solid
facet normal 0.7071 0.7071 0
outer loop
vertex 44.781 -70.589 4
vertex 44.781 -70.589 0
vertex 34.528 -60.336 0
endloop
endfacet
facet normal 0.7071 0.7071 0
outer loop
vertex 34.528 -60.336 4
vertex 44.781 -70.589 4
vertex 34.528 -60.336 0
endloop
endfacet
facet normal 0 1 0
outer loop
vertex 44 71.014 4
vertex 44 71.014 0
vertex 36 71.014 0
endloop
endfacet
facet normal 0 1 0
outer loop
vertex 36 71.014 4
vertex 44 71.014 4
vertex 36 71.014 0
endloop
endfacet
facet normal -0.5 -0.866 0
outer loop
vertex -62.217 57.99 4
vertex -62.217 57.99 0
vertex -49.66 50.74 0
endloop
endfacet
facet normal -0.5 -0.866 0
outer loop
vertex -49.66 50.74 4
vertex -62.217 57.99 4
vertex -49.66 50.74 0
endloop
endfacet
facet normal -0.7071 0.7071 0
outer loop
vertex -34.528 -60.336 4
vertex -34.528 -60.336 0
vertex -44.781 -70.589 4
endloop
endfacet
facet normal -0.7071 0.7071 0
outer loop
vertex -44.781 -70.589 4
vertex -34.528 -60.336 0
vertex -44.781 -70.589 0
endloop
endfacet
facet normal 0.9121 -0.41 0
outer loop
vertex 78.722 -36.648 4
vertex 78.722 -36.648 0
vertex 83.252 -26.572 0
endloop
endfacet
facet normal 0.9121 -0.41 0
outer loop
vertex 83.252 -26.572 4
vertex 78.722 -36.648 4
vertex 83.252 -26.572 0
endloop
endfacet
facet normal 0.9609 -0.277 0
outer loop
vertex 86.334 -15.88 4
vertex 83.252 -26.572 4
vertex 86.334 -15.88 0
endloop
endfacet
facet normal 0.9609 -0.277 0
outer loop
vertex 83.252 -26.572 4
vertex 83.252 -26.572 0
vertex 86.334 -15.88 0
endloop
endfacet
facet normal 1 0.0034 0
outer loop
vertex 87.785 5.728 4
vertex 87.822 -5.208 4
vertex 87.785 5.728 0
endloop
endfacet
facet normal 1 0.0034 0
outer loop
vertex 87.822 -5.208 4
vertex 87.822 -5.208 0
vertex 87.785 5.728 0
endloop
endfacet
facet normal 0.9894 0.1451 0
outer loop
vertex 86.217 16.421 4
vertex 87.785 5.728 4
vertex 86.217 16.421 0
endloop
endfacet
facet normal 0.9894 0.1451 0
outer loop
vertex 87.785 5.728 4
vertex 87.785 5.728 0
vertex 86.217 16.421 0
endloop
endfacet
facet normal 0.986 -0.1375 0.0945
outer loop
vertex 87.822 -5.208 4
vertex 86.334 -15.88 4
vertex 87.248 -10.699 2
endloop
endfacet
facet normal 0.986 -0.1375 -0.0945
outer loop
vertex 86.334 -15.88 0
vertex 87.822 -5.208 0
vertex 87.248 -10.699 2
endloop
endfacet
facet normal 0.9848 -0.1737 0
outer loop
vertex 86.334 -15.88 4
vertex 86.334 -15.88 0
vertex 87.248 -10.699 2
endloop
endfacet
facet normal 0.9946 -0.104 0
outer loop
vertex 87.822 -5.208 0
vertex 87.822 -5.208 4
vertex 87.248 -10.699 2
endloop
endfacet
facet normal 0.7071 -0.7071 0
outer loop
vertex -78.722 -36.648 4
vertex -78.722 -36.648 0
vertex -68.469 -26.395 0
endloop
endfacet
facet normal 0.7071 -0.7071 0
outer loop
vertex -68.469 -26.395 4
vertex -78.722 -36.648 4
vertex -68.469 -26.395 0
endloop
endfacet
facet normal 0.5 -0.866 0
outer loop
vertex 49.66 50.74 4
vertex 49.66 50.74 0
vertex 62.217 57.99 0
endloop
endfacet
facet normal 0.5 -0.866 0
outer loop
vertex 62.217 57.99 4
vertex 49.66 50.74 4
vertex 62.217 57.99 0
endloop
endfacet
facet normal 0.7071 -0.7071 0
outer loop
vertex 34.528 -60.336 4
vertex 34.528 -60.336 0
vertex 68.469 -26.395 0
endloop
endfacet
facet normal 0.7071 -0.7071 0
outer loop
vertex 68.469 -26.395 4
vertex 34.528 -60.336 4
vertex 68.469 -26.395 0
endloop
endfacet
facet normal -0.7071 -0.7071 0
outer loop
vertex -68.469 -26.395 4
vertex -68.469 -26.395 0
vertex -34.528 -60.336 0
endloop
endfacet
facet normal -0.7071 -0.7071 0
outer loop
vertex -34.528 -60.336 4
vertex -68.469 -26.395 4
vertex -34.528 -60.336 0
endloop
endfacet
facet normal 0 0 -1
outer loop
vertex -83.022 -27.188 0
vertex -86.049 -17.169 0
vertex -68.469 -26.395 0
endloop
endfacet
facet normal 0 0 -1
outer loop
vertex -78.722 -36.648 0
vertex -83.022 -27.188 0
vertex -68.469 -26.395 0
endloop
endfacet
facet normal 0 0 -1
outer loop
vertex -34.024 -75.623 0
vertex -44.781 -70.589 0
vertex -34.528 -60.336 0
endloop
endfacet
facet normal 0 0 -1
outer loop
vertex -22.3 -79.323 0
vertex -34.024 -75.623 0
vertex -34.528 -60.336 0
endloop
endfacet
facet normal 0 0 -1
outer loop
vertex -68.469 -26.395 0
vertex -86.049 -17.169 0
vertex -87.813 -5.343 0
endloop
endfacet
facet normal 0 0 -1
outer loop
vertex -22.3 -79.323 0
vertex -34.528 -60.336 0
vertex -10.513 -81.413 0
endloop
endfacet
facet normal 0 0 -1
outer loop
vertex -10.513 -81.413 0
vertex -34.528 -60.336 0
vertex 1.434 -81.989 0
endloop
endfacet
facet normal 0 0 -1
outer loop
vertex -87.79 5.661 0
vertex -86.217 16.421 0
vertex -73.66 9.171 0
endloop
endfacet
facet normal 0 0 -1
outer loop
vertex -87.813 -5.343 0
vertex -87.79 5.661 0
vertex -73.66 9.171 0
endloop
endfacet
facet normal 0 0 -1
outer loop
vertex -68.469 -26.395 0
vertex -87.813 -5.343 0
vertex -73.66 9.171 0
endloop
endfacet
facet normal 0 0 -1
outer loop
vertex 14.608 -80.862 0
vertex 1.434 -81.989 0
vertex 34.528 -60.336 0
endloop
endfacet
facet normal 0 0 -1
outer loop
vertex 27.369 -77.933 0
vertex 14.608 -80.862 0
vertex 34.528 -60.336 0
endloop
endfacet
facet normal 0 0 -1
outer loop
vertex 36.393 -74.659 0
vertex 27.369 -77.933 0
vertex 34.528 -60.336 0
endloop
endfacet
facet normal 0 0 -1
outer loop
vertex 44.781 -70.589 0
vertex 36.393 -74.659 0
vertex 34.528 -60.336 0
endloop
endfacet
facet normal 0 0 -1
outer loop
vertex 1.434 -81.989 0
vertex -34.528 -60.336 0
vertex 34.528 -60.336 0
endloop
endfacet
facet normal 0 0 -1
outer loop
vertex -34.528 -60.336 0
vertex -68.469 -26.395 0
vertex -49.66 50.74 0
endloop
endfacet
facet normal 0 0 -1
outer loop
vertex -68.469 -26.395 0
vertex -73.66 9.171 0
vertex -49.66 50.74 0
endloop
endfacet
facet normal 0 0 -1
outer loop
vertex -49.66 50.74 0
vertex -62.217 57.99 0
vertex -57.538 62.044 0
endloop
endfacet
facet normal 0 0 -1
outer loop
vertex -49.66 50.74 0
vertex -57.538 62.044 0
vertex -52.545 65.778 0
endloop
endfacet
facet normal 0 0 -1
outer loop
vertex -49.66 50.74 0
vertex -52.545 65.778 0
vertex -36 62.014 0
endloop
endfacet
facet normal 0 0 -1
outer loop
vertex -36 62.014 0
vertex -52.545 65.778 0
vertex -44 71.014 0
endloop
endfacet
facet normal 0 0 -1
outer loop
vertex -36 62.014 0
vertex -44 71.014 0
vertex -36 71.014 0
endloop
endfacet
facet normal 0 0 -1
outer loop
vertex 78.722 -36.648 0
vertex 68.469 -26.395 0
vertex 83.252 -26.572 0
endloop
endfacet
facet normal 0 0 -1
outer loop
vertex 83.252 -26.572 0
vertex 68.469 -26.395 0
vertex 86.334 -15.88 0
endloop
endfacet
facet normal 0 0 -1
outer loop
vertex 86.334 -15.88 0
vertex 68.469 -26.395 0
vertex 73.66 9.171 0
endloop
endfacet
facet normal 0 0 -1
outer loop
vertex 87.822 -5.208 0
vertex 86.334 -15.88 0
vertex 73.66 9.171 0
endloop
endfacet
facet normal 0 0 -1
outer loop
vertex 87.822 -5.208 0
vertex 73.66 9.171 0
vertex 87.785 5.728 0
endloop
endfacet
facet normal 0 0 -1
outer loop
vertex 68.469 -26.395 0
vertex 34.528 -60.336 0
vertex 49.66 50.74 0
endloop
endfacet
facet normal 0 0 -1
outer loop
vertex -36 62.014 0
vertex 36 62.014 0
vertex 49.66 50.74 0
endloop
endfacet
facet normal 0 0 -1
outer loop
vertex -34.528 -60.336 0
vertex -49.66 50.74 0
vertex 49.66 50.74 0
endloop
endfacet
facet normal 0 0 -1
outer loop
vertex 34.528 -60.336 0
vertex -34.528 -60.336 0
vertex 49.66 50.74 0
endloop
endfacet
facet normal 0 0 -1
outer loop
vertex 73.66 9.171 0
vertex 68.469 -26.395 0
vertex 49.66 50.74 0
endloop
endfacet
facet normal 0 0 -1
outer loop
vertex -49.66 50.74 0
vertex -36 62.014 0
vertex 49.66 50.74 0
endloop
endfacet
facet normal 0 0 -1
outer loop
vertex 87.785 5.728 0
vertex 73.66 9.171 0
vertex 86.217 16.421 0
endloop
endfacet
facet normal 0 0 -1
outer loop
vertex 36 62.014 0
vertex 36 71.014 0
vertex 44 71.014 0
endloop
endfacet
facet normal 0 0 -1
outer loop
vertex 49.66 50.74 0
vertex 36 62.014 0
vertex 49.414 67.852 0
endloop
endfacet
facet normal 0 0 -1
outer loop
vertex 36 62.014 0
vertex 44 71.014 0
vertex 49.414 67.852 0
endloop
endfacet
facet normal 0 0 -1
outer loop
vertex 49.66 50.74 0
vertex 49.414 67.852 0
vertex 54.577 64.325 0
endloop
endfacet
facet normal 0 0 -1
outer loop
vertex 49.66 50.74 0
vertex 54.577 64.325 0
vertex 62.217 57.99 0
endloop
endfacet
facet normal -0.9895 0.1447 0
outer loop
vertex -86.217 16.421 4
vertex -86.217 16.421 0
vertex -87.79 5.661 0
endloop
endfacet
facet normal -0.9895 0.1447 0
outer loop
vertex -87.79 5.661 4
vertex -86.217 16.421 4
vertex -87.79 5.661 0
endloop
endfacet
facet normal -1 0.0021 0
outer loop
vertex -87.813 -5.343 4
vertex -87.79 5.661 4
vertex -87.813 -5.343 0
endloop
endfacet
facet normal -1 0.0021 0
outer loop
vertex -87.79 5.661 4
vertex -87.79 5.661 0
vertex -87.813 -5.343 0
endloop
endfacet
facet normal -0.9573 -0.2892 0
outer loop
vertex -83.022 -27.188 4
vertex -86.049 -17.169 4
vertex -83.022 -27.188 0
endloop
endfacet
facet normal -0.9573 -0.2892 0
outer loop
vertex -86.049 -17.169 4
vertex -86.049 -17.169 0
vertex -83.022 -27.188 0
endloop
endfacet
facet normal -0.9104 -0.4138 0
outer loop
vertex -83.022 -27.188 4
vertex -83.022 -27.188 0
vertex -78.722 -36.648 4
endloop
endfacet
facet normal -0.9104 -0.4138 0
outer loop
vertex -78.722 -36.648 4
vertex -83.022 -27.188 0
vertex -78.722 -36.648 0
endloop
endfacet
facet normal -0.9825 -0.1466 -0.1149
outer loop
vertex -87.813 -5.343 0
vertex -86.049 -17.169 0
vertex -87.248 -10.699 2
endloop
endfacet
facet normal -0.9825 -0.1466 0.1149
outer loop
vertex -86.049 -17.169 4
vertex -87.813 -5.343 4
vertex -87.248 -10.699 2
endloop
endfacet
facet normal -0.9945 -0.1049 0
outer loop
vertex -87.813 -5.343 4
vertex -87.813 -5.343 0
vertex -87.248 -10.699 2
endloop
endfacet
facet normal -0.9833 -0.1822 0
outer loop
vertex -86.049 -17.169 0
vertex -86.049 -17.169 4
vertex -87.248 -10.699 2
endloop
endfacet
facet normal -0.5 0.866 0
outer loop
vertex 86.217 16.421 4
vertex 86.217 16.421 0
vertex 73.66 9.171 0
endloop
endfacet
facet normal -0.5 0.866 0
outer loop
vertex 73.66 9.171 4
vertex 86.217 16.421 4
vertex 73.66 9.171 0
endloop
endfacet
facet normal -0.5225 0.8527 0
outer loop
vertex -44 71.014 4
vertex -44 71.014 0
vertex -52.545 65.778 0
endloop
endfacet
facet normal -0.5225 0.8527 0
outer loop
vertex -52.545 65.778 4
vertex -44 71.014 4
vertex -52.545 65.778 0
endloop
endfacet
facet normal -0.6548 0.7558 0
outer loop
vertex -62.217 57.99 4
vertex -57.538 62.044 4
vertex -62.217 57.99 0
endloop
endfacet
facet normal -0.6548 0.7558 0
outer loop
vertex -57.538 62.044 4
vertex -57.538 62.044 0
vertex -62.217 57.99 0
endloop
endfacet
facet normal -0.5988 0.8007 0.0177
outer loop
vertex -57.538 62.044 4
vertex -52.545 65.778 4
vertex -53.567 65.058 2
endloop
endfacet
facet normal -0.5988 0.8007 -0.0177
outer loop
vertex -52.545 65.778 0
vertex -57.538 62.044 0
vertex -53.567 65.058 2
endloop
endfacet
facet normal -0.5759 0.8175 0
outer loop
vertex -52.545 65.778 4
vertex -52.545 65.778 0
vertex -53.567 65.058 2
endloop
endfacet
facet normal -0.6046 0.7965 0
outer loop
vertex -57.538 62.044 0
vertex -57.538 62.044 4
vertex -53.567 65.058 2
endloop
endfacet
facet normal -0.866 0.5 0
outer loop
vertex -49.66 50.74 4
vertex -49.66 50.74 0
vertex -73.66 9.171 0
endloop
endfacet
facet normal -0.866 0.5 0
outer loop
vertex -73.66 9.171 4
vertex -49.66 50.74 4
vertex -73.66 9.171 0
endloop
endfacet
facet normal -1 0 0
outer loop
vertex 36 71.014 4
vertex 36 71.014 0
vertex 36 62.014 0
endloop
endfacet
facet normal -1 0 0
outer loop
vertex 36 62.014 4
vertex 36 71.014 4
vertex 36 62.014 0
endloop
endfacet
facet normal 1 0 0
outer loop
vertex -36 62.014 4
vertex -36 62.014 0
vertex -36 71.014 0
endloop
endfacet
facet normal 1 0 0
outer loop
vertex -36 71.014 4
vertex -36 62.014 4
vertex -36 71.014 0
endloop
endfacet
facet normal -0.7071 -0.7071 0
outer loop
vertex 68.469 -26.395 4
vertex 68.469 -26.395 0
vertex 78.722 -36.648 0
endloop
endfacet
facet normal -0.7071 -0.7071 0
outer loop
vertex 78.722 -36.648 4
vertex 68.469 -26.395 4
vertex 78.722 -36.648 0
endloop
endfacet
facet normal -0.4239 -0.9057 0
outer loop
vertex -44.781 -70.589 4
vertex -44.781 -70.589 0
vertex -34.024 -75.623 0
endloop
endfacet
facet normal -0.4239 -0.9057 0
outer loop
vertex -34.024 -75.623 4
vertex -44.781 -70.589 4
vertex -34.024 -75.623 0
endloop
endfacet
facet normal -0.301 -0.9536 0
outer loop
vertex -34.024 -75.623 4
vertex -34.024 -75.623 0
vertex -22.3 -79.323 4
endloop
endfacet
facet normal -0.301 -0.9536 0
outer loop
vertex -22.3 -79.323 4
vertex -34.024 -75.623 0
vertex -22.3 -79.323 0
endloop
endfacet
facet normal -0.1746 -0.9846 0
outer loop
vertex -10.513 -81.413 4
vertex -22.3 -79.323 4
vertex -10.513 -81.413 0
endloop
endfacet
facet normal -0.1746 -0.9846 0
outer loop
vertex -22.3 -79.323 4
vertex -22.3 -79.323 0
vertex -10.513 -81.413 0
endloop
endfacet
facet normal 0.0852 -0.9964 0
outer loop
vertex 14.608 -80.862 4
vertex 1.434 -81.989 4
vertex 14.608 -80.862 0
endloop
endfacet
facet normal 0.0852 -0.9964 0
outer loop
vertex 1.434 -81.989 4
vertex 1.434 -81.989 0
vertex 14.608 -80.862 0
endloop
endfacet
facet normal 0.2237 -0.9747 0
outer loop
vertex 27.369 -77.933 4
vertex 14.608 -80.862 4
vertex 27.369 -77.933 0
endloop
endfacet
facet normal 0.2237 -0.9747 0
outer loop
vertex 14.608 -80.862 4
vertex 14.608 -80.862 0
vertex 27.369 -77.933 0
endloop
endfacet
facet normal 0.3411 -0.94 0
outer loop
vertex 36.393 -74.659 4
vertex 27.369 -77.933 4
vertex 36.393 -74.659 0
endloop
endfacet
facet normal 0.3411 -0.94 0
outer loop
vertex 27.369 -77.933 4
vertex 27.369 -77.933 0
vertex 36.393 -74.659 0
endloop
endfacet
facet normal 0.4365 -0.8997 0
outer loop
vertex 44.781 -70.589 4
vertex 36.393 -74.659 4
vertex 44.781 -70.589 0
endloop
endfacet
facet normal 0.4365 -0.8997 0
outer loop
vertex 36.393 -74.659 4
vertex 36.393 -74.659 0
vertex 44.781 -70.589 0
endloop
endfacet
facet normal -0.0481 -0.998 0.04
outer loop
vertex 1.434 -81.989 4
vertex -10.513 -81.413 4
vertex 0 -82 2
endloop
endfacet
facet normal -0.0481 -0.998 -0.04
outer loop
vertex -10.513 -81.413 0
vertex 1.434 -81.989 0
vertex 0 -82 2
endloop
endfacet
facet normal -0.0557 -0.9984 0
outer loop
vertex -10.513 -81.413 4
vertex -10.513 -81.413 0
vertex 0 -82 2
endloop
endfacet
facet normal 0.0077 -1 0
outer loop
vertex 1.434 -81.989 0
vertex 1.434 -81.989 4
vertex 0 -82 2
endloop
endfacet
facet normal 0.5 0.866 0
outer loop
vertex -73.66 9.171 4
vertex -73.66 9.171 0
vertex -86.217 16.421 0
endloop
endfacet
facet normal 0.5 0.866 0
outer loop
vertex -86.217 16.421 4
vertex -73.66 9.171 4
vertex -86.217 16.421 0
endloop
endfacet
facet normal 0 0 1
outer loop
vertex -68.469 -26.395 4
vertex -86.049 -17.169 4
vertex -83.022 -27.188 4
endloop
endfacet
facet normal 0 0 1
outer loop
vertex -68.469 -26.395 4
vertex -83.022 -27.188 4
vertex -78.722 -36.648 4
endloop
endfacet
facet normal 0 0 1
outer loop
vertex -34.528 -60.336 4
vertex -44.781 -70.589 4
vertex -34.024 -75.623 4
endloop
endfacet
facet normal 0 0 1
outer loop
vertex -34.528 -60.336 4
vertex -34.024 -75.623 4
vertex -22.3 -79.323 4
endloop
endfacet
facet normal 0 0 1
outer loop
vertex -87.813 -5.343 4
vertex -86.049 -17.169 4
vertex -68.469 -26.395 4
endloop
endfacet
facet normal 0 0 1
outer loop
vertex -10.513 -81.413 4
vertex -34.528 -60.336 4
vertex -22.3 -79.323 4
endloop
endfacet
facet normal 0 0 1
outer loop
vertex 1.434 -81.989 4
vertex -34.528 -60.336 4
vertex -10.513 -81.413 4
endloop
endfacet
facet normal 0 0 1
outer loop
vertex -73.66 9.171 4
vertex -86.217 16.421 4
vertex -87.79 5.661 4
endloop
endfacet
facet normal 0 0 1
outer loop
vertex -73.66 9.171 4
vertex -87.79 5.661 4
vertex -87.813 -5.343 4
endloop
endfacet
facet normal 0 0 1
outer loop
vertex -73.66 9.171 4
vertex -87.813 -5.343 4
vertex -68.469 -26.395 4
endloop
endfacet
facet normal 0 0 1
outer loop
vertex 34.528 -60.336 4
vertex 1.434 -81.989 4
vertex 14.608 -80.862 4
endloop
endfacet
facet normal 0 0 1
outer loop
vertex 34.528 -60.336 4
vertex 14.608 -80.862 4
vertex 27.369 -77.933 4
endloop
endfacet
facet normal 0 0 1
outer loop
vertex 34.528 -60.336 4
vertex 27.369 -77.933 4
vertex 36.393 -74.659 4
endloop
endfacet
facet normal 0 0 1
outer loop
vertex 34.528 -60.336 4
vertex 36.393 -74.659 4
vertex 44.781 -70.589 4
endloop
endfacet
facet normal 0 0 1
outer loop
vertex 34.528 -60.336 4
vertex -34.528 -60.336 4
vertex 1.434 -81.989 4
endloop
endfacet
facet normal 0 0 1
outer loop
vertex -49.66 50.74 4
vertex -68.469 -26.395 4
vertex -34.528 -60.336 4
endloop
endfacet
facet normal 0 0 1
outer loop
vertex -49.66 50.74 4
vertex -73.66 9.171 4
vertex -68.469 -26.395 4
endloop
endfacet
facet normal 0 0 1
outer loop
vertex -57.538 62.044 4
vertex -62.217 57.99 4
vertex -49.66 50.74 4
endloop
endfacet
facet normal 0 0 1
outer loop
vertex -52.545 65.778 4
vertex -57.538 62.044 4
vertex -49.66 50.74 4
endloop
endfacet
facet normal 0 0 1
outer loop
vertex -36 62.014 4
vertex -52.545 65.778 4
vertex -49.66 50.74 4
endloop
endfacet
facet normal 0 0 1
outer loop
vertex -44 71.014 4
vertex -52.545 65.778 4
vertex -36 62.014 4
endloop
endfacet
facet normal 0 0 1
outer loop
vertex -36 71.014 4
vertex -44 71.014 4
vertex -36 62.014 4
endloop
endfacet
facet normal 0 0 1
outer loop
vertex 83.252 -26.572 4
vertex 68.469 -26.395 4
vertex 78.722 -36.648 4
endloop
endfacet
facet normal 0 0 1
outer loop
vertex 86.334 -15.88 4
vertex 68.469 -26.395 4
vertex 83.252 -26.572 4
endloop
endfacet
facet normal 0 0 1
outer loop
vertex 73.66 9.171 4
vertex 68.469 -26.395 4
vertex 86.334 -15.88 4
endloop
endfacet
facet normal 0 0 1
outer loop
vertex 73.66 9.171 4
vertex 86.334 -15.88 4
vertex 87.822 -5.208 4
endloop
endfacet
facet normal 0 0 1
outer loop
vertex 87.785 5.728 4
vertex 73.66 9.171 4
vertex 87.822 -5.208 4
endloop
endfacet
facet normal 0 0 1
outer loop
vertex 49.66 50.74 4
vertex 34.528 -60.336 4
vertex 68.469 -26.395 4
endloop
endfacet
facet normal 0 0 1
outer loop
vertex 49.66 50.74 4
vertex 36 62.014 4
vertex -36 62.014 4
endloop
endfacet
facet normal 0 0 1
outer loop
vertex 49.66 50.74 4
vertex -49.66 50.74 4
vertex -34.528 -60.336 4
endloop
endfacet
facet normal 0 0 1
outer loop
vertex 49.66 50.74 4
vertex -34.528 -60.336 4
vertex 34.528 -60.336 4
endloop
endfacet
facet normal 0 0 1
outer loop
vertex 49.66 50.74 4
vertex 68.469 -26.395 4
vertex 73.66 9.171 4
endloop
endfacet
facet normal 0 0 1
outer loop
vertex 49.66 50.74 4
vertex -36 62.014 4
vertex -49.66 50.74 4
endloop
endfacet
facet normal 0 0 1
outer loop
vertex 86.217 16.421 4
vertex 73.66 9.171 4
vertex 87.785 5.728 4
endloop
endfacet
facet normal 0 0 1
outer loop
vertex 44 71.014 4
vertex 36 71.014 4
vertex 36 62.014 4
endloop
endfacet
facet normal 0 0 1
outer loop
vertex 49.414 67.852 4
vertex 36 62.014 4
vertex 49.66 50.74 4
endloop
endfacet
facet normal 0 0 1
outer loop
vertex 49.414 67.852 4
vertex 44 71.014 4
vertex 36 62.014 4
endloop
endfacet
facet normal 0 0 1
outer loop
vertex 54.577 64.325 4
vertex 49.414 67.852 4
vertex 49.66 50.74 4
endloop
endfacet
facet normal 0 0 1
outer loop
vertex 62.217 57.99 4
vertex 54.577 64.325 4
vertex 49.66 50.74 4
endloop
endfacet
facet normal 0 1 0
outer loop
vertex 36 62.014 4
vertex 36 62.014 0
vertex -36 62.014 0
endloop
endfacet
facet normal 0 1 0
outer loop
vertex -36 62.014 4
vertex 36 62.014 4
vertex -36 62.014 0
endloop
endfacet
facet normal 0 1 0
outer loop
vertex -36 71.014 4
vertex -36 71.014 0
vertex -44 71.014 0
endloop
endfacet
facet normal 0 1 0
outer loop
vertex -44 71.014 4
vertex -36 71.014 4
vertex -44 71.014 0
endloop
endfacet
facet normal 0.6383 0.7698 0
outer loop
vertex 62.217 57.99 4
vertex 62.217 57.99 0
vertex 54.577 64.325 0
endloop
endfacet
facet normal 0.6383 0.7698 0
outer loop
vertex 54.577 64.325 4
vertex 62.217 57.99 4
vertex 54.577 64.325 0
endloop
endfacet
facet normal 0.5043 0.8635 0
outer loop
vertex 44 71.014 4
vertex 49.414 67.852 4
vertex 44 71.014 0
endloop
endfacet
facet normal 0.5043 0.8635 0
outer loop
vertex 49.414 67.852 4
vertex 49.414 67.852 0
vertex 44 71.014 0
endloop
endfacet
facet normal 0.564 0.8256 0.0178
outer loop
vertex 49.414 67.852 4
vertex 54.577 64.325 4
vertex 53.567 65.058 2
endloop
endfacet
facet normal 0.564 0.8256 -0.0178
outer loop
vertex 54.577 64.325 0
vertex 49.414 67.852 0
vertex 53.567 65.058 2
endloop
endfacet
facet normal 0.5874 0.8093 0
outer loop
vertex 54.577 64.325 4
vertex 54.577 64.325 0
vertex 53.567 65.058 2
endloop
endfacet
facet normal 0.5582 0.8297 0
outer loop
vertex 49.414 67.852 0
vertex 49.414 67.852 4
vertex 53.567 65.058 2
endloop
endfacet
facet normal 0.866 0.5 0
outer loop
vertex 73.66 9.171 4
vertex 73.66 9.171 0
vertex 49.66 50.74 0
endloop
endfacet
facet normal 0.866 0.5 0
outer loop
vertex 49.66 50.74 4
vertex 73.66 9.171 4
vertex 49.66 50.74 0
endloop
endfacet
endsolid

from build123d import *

# Parameters (mm, degrees)
F1_DEPTH = 4


with BuildPart() as f1:
    # F0 (on Top) → F1 (new body)
    with BuildSketch(Plane.XY):
        with BuildLine():
            Line((-36, 71.0140831103), (-44, 71.0140831103))
            add(Edge.make_bspline(
                [(-44, 71.0140831103), (-54.0283164257, 65.6189945034), (-62.2174482843, 57.990161631)],
                knots=[5.235987756, 5.235987756, 5.235987756, 5.4976594153, 5.4976594153, 5.4976594153], degree=2, weights=[1, 0.9914531953, 1]))
            Line((-62.2174482843, 57.990161631), (-49.6600799294, 50.740161631))
            Line((-49.6600799294, 50.740161631), (-73.6600799294, 9.1709422494))
            Line((-73.6600799294, 9.1709422494), (-86.2174482843, 16.4209422494))
            add(Edge.make_bspline(
                [(-86.2174482843, 16.4209422494), (-92.3022663318, -11.319095525), (-78.7223993606, -36.6476383594)],
                knots=[6.0815667198, 6.0815667198, 6.0815667198, 6.7465073975, 6.7465073975, 6.7465073975], degree=2, weights=[1, 0.9452389616, 1]))
            Line((-78.7223993606, -36.6476383594), (-68.4693510334, -26.3945900322))
            Line((-68.4693510334, -26.3945900322), (-34.5282255364, -60.3357155292))
            Line((-34.5282255364, -60.3357155292), (-44.7812738636, -70.5887638564))
            add(Edge.make_bspline(
                [(-44.7812738636, -70.5887638564), (0, -95.2559533934), (44.7812738636, -70.5887638564)],
                knots=[1.0369152893, 1.0369152893, 1.0369152893, 2.1046773643, 2.1046773643, 2.1046773643], degree=2, weights=[1, 0.8608385836, 1]))
            Line((44.7812738636, -70.5887638564), (34.5282255364, -60.3357155292))
            Line((34.5282255364, -60.3357155292), (68.4693510334, -26.3945900322))
            Line((68.4693510334, -26.3945900322), (78.7223993606, -36.6476383594))
            add(Edge.make_bspline(
                [(78.7223993606, -36.6476383594), (92.3022663318, -11.319095525), (86.2174482843, 16.4209422494)],
                knots=[2.6782705633, 2.6782705633, 2.6782705633, 3.343211241, 3.343211241, 3.343211241], degree=2, weights=[1, 0.9452389616, 1]))
            Line((86.2174482843, 16.4209422494), (73.6600799294, 9.1709422494))
            Line((73.6600799294, 9.1709422494), (49.6600799294, 50.740161631))
            Line((49.6600799294, 50.740161631), (62.2174482843, 57.990161631))
            add(Edge.make_bspline(
                [(62.2174482843, 57.990161631), (54.0283164257, 65.6189945034), (44, 71.0140831103)],
                knots=[3.9271185454, 3.9271185454, 3.9271185454, 4.1887902048, 4.1887902048, 4.1887902048], degree=2, weights=[1, 0.9914531953, 1]))
            Line((44, 71.0140831103), (36, 71.0140831103))
            Line((36, 71.0140831103), (36, 62.0140831103))
            Line((36, 62.0140831103), (-36, 62.0140831103))
            Line((-36, 62.0140831103), (-36, 71.0140831103))
        make_face()
    extrude(amount=F1_DEPTH)


solid = f1.part
